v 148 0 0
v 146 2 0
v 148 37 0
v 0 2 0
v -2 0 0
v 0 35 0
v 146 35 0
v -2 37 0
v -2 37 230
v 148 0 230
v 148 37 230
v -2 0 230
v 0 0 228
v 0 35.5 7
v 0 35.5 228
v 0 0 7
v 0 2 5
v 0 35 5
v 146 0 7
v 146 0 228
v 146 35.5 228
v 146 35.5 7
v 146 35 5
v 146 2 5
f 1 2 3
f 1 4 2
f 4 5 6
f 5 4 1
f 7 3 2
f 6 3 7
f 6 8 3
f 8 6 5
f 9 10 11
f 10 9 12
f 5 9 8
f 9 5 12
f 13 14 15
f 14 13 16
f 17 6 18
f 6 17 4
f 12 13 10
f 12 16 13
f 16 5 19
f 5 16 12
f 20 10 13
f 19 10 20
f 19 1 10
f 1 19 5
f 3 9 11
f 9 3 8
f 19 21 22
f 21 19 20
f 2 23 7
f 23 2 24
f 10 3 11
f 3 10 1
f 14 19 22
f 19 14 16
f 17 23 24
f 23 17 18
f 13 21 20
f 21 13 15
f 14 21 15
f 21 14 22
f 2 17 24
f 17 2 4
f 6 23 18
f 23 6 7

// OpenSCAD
// file: wood.scad
include <tools.scad>

//Draw a board and displays its dimensions
module board(length, width, thickness, quiet=true){
	cube([length, width, thickness]);
	
	if(!quiet){
		echo(str("Board: ",length,"x",width,"x",thickness," ",unit));
	}
}

board(10, 10, 1, false);
// file: tools.scad
unit="mm";

//Draw reference axis
module drawAxis(s=1){
	rotate([0, 90, 0]) color("Crimson") cylinder(h=s, r1=s/20, r2=s/20, $fn=10);
	rotate([-90, 0, 0]) color("LimeGreen") cylinder(h=s, r1=s/20, r2=s/20, $fn=10);
	color("DodgerBlue") cylinder(h=s, r1=s/20, r2=s/20, $fn=10);
}

// drawAxis(1);
// 
// translate([2, 0, 0]) rotate([0, -45, 0]) drawAxis(1);
// 
// rotate([0, -45, 0]) translate([2, 0, 0]) drawAxis(1);
// file: sample_wood.scad
include <tools.scad>
use <wood.scad>

module board_darkWood(length, width, thickness){
	color("SaddleBrown") board(length, width, thickness);
	
	echo(str("Board, dark wood: ",length,"x",width,"x",thickness," ",unit));
}

board_darkWood(10, 10, 1);

module board_greyWood(length, width, thickness){
	color("OldLace") board(length, width, thickness);
	
	echo(str("Board, grey wood: ",length,"x",width,"x",thickness," ",unit));
}

translate([15, 0, 0]) board_greyWood(10, 10, 1);

module board_lightWood(length, width, thickness){
	color("BlanchedAlmond") board(length, width, thickness);
	
	echo(str("Board, light wood: ",length,"x",width,"x",thickness," ",unit));
}

translate([30, 0, 0]) board_lightWood(10, 10, 1);
// main file
use <sample_wood.scad>
use <tools.scad>

module cabinet(cabinet_height, cabinet_width, cabinet_depth, foot_height, side_thickness, back_thickness) {
	shelves_length=cabinet_width-2*side_thickness;
	
	//Left
	translate([0, 0, 0]) rotate([0, -90, 0]) board_lightWood(cabinet_height, cabinet_depth, side_thickness);
	
	//Right
	translate([cabinet_width-side_thickness, 0, 0]) rotate([0, -90, 0]) board_lightWood(cabinet_height, cabinet_depth, side_thickness);
	
	//Bottom
	translate([0, 0, foot_height]) board_lightWood(shelves_length, cabinet_depth, side_thickness);
	
	//Top
	translate([0, 0, cabinet_height-side_thickness]) board_lightWood(shelves_length, cabinet_depth, side_thickness);
	
	//Back
	bevel=side_thickness-0.5;
	translate([-bevel, cabinet_depth, foot_height+side_thickness-bevel]) rotate([90, 0, 0]) board_darkWood(shelves_length+2*bevel, cabinet_height-foot_height-2*side_thickness+2*bevel, back_thickness);
	
	//Foot reinforcement
	translate([0, side_thickness, 0]) rotate([90, 0, 0]) board_lightWood(shelves_length, foot_height, side_thickness);
	translate([0, cabinet_depth, 0]) rotate([90, 0, 0]) board_lightWood(shelves_length, foot_height, side_thickness);
}

cabinet(cabinet_height=230, cabinet_width=150, cabinet_depth=37, foot_height=5, side_thickness=2, back_thickness=1.5);
